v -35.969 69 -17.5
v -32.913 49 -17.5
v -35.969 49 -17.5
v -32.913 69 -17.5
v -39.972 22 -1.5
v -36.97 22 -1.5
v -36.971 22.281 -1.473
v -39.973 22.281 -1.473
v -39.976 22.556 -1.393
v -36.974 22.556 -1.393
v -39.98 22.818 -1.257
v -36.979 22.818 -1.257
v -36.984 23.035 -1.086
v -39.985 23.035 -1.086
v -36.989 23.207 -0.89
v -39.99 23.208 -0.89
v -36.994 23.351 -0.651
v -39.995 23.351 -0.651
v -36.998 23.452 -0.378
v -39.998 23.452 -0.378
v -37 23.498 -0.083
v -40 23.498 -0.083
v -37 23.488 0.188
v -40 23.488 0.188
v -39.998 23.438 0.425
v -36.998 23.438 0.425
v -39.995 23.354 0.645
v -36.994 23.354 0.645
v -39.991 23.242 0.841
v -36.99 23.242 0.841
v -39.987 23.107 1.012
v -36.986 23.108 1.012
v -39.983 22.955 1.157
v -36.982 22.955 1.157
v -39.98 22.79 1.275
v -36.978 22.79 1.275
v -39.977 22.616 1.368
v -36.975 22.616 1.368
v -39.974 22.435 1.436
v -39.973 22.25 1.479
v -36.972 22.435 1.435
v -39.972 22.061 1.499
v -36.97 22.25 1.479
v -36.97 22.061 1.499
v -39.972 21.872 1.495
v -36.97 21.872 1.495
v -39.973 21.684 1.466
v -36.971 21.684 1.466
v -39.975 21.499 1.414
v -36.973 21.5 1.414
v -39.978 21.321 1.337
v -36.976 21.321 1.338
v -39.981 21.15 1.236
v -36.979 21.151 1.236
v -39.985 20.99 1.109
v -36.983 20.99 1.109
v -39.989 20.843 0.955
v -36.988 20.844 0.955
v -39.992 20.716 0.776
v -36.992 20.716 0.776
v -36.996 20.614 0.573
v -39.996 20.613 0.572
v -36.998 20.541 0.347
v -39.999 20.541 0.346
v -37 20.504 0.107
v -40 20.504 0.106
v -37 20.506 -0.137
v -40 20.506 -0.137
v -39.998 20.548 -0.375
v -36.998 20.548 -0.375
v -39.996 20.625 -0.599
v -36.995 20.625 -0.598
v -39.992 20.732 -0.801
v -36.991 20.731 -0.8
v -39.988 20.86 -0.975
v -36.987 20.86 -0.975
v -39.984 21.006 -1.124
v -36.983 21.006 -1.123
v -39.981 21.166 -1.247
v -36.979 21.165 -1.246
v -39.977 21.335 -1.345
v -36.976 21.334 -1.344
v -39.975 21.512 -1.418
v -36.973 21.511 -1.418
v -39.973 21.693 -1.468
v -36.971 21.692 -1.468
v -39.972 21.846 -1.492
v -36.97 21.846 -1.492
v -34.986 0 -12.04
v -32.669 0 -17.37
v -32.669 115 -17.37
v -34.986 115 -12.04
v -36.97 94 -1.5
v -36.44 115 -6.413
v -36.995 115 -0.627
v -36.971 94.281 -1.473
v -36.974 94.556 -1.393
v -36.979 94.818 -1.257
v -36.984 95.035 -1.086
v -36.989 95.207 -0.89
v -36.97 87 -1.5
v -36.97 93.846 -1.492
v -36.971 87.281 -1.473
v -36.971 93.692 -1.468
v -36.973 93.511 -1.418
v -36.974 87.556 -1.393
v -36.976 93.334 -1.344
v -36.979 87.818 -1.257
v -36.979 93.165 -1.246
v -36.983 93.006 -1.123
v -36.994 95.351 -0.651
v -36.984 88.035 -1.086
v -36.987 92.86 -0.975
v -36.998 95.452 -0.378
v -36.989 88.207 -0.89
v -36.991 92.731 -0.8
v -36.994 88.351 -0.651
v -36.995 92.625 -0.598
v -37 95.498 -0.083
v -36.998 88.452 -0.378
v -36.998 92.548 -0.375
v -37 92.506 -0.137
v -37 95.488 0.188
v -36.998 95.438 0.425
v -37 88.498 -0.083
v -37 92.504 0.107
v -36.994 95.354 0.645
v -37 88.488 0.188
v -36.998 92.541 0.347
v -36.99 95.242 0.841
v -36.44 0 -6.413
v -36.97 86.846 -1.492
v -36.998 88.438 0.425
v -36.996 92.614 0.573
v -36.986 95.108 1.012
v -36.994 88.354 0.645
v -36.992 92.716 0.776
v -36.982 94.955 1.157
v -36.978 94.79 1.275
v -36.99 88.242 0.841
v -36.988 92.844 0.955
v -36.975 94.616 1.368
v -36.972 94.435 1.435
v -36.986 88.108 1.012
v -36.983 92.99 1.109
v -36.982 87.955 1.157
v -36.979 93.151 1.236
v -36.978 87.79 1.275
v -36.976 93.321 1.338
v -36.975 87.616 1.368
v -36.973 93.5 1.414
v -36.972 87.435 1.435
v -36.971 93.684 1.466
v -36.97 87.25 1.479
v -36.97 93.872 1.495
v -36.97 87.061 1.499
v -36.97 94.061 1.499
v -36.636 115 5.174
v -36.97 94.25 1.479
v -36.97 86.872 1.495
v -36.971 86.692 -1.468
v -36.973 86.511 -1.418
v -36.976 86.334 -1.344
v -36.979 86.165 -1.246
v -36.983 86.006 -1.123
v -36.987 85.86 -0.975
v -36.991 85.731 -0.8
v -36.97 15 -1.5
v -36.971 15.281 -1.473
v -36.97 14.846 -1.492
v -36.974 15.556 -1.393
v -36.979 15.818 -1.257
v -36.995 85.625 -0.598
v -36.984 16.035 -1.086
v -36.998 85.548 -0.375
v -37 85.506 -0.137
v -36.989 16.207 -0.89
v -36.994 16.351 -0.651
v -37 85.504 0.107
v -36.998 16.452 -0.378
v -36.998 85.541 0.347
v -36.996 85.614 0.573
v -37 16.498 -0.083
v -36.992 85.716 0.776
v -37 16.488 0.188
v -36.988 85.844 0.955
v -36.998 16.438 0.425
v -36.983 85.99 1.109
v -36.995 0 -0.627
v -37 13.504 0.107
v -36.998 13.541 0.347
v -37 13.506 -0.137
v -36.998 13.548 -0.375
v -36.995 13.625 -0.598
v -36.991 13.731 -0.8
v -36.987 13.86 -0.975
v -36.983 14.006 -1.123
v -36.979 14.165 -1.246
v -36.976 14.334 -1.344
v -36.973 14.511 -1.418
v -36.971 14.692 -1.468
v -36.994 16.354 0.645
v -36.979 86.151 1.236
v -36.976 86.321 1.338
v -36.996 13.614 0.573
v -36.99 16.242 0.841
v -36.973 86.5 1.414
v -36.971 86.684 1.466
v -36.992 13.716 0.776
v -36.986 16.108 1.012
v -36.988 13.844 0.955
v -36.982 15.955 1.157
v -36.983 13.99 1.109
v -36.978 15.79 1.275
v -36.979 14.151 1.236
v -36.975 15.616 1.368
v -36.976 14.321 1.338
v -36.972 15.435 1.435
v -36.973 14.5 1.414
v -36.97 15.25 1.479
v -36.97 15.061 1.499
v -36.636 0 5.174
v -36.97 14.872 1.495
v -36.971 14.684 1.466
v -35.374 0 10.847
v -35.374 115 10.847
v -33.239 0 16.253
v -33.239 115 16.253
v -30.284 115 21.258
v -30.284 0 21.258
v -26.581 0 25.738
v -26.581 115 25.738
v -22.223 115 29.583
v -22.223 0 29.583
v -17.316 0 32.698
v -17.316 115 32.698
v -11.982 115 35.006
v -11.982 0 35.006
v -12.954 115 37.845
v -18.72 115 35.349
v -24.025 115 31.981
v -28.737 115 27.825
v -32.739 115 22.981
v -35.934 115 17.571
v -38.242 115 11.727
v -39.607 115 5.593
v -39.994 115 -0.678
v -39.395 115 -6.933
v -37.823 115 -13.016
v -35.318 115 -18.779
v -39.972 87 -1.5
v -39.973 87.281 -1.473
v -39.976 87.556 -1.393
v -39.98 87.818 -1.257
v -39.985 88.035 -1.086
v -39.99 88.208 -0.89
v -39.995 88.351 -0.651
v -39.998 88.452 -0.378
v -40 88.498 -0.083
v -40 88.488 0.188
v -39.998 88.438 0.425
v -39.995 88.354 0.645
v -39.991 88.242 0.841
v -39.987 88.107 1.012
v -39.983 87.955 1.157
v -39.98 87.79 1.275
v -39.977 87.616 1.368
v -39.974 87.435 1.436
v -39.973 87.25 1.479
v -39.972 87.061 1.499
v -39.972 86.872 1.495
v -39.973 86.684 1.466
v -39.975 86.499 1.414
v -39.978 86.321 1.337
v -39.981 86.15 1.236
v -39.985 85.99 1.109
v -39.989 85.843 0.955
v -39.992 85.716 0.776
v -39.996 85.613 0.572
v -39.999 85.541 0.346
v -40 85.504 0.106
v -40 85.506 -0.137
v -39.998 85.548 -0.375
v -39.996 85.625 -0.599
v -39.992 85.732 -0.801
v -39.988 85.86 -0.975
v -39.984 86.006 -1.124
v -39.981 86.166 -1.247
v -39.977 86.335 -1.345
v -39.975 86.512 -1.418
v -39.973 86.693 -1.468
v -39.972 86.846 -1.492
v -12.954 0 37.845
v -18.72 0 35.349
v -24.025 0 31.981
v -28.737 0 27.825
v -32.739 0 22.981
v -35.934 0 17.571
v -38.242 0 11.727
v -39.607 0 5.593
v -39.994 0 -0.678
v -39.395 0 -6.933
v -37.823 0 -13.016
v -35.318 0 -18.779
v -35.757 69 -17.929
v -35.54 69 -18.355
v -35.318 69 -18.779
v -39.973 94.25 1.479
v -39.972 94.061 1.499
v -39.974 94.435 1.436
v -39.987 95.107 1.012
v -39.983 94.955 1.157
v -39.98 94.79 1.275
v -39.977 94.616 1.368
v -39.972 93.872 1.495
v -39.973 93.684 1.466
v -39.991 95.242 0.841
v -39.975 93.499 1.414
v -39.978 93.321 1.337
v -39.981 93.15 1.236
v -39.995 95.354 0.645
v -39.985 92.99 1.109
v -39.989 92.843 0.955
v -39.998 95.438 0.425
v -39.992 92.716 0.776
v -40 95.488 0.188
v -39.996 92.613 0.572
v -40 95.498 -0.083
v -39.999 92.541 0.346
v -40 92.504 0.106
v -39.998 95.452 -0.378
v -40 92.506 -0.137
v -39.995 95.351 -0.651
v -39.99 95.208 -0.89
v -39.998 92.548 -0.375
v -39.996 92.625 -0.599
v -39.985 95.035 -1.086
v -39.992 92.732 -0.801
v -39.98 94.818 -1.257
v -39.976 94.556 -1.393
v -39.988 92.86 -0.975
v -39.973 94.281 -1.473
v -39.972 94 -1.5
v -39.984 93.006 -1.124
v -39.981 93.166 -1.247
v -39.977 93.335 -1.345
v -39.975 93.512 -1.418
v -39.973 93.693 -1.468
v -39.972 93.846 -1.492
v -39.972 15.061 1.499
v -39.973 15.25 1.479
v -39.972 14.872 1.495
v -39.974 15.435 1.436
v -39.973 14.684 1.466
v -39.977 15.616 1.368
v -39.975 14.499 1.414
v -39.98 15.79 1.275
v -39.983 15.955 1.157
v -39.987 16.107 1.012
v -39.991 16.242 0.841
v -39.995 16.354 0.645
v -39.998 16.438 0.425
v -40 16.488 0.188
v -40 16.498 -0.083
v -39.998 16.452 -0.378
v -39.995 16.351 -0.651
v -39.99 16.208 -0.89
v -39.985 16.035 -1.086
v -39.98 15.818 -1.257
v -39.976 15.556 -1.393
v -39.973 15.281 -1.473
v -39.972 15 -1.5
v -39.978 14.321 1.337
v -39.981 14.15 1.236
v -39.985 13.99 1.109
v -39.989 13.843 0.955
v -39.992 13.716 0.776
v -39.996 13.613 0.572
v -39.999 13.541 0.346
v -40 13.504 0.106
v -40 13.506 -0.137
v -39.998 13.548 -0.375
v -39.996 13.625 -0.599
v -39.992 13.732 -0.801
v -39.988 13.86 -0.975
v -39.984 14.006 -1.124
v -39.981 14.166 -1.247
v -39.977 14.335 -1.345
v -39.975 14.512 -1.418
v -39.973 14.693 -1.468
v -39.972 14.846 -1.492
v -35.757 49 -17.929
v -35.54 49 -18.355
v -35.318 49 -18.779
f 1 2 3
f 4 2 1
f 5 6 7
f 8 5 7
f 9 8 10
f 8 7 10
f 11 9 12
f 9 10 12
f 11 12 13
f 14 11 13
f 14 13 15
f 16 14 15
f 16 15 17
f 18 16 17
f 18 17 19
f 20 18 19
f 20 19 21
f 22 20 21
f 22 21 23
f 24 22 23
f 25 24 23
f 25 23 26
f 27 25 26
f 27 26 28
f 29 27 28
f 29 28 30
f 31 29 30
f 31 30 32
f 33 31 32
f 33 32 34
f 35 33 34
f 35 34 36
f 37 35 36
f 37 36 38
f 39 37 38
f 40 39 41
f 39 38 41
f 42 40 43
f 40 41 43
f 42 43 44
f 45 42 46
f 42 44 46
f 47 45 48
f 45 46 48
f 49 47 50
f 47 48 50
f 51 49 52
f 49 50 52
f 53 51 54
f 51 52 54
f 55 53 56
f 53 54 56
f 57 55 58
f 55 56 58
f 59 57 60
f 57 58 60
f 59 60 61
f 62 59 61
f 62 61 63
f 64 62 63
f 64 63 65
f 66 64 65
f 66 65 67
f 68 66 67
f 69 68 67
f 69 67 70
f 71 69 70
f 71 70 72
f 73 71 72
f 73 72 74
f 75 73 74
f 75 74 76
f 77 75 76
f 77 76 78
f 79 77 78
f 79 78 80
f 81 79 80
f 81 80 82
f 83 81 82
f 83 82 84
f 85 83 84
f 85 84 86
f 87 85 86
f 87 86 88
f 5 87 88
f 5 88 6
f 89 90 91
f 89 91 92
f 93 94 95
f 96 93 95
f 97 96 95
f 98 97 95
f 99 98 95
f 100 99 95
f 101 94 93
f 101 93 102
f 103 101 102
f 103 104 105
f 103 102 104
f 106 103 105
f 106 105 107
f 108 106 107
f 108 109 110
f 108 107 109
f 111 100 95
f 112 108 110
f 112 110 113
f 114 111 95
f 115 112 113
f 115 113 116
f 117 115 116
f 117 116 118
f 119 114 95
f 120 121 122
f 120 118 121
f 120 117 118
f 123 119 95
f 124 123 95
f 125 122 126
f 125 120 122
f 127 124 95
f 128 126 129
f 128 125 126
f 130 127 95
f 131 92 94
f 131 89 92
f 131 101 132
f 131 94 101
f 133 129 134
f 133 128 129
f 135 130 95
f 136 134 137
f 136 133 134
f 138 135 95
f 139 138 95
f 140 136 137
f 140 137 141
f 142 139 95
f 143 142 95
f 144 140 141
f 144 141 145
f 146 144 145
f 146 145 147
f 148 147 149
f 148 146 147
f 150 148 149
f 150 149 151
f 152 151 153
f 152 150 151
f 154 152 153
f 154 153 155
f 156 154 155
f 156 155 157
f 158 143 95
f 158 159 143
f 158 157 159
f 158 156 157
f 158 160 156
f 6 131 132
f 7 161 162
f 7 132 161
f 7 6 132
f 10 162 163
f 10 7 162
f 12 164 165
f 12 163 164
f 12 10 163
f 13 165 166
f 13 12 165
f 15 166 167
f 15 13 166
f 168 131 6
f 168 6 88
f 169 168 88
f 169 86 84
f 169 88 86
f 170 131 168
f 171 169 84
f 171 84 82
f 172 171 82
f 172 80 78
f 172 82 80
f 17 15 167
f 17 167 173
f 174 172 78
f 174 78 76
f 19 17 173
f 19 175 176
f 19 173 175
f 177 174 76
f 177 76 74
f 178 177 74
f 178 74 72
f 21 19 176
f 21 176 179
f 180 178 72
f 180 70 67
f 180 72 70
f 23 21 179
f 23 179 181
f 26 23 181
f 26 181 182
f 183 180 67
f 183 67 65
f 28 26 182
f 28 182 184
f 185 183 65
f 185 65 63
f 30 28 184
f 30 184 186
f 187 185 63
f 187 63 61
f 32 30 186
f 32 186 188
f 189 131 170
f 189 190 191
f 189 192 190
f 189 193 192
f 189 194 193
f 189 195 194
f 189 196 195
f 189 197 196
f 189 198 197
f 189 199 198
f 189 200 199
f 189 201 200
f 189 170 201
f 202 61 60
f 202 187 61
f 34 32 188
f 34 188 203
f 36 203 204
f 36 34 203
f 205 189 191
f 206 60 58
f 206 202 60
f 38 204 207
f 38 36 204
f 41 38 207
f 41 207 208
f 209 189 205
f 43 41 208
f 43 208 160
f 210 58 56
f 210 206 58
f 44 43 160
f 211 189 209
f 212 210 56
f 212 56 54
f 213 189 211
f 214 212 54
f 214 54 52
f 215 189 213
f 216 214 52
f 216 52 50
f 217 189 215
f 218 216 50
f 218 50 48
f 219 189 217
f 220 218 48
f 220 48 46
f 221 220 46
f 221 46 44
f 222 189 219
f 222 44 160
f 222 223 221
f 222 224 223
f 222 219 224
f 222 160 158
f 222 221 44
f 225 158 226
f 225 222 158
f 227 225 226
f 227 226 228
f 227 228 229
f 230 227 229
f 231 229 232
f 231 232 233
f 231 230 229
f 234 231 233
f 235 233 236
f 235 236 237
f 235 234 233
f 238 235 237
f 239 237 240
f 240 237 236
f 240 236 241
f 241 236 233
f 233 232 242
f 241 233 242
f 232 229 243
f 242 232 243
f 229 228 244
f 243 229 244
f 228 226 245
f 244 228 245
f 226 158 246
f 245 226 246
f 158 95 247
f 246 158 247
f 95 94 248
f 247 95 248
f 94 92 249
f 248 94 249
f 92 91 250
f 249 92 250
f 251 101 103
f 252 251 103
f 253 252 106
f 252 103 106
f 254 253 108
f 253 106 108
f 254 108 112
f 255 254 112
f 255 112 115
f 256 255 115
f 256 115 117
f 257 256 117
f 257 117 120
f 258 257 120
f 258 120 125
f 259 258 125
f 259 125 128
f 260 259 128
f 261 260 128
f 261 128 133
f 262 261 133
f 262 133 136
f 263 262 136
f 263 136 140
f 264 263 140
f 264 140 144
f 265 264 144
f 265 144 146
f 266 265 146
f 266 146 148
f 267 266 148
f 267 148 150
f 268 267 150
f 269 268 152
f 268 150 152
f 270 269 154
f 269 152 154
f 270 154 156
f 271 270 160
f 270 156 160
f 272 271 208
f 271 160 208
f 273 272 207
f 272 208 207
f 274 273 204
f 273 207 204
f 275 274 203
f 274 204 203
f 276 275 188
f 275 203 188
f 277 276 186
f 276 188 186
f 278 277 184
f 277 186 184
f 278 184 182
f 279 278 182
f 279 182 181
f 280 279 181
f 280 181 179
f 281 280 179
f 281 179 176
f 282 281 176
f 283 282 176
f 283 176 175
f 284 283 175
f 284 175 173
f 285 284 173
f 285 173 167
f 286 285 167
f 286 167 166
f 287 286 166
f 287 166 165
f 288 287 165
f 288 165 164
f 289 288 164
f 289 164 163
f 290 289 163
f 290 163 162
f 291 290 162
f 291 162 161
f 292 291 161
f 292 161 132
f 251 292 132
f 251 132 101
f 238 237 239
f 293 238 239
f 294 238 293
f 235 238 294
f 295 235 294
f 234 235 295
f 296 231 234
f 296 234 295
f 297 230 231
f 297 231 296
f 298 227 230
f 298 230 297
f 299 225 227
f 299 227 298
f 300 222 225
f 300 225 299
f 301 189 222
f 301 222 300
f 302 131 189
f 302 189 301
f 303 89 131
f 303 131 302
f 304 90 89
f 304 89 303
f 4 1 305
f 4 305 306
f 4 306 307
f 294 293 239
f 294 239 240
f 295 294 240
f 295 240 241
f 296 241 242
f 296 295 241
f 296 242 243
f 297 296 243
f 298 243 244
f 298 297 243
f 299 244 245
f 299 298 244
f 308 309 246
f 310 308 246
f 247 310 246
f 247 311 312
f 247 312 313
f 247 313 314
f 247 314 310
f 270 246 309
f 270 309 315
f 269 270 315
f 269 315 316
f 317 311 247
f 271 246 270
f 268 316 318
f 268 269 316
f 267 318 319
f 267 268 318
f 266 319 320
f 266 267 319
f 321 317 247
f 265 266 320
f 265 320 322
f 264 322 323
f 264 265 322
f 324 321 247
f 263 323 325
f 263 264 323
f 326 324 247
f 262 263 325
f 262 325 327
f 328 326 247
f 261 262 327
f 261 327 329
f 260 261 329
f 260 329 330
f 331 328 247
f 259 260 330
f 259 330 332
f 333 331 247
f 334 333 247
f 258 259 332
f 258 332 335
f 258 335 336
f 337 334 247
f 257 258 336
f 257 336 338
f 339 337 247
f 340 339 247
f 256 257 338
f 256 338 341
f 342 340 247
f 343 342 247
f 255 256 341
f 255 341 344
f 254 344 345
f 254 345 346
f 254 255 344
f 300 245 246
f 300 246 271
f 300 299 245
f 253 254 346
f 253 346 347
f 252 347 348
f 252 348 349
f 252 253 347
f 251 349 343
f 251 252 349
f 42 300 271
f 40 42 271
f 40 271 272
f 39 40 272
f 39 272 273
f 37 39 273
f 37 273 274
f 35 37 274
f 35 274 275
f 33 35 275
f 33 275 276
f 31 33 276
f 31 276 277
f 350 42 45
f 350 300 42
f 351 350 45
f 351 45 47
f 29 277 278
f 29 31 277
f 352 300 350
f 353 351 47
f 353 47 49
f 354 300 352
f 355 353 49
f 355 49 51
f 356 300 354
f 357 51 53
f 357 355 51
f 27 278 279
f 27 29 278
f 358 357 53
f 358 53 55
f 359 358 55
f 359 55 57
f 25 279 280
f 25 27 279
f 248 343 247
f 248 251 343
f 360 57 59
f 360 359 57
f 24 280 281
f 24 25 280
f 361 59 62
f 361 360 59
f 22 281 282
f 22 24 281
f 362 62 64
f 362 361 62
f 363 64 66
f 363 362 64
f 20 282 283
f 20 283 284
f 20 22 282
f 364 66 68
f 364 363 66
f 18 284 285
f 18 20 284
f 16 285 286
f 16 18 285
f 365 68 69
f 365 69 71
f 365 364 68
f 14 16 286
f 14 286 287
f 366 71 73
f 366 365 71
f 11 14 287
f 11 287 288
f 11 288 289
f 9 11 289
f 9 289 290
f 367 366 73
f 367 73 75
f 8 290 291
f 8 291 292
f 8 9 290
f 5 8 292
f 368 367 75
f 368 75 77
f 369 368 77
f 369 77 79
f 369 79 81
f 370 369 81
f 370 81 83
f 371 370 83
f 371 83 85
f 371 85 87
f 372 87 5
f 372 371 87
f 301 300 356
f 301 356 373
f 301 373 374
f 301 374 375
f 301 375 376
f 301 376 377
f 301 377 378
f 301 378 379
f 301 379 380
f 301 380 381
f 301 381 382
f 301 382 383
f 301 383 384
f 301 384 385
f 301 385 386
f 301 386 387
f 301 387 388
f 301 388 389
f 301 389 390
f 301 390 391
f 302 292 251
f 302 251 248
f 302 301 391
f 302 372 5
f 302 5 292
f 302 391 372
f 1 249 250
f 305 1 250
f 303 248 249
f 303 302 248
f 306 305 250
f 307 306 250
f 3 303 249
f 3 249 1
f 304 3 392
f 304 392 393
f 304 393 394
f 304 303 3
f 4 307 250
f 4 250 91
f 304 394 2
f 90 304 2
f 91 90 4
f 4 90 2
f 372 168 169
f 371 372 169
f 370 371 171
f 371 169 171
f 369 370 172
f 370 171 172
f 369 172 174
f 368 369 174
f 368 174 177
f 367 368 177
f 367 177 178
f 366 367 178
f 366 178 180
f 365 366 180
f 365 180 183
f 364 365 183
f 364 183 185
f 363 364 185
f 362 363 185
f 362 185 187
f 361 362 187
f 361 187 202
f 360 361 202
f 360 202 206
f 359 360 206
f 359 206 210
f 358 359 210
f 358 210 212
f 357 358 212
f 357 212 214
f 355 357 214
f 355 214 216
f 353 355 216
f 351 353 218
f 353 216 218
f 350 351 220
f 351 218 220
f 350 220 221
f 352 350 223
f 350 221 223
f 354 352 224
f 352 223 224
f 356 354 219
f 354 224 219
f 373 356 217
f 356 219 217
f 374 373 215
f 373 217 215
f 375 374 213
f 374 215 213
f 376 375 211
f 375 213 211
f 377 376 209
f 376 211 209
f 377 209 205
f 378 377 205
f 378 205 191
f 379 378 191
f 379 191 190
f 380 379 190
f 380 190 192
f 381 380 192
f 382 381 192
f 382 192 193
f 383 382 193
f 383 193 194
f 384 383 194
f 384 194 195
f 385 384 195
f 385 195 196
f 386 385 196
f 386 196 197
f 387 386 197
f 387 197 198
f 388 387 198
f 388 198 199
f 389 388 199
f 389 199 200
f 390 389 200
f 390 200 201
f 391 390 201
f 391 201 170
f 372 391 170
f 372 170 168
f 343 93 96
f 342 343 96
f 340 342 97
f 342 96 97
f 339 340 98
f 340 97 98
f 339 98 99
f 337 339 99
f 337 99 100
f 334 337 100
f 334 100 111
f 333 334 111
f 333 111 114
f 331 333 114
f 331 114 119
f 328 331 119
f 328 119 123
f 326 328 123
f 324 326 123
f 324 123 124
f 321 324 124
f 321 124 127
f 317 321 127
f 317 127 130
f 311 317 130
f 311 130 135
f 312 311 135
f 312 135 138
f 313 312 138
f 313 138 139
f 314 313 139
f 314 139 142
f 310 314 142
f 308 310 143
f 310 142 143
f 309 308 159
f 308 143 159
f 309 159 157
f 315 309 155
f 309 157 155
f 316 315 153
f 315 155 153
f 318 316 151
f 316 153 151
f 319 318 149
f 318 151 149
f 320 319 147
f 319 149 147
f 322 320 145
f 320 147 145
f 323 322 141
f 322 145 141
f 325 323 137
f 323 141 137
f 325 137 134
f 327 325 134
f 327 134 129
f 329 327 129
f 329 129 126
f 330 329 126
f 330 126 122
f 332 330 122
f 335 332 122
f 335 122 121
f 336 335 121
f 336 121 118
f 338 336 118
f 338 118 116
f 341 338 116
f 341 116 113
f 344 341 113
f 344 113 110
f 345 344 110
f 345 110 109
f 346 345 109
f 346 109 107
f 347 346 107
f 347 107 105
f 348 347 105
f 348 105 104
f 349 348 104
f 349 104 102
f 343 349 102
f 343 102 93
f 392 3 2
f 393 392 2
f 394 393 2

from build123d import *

# Parameters (mm, degrees)
EXTRUSION1_DEPTH = 115
ESQUISSE6_R      = 1.5
ESQUISSE6_W      = 11.044450352
ESQUISSE6_H      = 20
EXTRUSION2_DEPTH = 120


with BuildPart() as part:
    # Esquisse5 → Extrusion1 (new body)
    with BuildSketch(Plane(origin=(0, 0, 0), x_dir=(1, 0, 0), z_dir=(0, 1, 0))):
        with BuildLine():
            Line((-11.982008115, -35.006163479), (-12.953522286, -37.844501059))
            ThreePointArc((-12.953522286, -37.844501059), (-37.203278989, -14.694081546), (-35.317903714, 18.778862511))
            Line((-35.317903714, 18.778862511), (-32.669060936, 17.370447823))
            ThreePointArc((-32.669060936, 17.370447823), (-34.413033065, -13.59202543), (-11.982008115, -35.006163479))
        make_face()
    extrude(amount=EXTRUSION1_DEPTH)

    # Esquisse6 → Extrusion2 (cut)
    with BuildSketch(Plane(origin=(0, 0, 0), x_dir=(0, 0, -1), z_dir=(1, 0, 0))):
        with Locations((0, 94)):
            Circle(ESQUISSE6_R)
        with Locations((0, 87)):
            Circle(ESQUISSE6_R)
        with Locations((0, 15)):
            Circle(ESQUISSE6_R)
        with Locations((0, 22)):
            Circle(ESQUISSE6_R)
        with Locations((23.022225176, 59)):
            Rectangle(ESQUISSE6_W, ESQUISSE6_H)
    extrude(amount=-EXTRUSION2_DEPTH, mode=Mode.SUBTRACT)


solid = part.part
